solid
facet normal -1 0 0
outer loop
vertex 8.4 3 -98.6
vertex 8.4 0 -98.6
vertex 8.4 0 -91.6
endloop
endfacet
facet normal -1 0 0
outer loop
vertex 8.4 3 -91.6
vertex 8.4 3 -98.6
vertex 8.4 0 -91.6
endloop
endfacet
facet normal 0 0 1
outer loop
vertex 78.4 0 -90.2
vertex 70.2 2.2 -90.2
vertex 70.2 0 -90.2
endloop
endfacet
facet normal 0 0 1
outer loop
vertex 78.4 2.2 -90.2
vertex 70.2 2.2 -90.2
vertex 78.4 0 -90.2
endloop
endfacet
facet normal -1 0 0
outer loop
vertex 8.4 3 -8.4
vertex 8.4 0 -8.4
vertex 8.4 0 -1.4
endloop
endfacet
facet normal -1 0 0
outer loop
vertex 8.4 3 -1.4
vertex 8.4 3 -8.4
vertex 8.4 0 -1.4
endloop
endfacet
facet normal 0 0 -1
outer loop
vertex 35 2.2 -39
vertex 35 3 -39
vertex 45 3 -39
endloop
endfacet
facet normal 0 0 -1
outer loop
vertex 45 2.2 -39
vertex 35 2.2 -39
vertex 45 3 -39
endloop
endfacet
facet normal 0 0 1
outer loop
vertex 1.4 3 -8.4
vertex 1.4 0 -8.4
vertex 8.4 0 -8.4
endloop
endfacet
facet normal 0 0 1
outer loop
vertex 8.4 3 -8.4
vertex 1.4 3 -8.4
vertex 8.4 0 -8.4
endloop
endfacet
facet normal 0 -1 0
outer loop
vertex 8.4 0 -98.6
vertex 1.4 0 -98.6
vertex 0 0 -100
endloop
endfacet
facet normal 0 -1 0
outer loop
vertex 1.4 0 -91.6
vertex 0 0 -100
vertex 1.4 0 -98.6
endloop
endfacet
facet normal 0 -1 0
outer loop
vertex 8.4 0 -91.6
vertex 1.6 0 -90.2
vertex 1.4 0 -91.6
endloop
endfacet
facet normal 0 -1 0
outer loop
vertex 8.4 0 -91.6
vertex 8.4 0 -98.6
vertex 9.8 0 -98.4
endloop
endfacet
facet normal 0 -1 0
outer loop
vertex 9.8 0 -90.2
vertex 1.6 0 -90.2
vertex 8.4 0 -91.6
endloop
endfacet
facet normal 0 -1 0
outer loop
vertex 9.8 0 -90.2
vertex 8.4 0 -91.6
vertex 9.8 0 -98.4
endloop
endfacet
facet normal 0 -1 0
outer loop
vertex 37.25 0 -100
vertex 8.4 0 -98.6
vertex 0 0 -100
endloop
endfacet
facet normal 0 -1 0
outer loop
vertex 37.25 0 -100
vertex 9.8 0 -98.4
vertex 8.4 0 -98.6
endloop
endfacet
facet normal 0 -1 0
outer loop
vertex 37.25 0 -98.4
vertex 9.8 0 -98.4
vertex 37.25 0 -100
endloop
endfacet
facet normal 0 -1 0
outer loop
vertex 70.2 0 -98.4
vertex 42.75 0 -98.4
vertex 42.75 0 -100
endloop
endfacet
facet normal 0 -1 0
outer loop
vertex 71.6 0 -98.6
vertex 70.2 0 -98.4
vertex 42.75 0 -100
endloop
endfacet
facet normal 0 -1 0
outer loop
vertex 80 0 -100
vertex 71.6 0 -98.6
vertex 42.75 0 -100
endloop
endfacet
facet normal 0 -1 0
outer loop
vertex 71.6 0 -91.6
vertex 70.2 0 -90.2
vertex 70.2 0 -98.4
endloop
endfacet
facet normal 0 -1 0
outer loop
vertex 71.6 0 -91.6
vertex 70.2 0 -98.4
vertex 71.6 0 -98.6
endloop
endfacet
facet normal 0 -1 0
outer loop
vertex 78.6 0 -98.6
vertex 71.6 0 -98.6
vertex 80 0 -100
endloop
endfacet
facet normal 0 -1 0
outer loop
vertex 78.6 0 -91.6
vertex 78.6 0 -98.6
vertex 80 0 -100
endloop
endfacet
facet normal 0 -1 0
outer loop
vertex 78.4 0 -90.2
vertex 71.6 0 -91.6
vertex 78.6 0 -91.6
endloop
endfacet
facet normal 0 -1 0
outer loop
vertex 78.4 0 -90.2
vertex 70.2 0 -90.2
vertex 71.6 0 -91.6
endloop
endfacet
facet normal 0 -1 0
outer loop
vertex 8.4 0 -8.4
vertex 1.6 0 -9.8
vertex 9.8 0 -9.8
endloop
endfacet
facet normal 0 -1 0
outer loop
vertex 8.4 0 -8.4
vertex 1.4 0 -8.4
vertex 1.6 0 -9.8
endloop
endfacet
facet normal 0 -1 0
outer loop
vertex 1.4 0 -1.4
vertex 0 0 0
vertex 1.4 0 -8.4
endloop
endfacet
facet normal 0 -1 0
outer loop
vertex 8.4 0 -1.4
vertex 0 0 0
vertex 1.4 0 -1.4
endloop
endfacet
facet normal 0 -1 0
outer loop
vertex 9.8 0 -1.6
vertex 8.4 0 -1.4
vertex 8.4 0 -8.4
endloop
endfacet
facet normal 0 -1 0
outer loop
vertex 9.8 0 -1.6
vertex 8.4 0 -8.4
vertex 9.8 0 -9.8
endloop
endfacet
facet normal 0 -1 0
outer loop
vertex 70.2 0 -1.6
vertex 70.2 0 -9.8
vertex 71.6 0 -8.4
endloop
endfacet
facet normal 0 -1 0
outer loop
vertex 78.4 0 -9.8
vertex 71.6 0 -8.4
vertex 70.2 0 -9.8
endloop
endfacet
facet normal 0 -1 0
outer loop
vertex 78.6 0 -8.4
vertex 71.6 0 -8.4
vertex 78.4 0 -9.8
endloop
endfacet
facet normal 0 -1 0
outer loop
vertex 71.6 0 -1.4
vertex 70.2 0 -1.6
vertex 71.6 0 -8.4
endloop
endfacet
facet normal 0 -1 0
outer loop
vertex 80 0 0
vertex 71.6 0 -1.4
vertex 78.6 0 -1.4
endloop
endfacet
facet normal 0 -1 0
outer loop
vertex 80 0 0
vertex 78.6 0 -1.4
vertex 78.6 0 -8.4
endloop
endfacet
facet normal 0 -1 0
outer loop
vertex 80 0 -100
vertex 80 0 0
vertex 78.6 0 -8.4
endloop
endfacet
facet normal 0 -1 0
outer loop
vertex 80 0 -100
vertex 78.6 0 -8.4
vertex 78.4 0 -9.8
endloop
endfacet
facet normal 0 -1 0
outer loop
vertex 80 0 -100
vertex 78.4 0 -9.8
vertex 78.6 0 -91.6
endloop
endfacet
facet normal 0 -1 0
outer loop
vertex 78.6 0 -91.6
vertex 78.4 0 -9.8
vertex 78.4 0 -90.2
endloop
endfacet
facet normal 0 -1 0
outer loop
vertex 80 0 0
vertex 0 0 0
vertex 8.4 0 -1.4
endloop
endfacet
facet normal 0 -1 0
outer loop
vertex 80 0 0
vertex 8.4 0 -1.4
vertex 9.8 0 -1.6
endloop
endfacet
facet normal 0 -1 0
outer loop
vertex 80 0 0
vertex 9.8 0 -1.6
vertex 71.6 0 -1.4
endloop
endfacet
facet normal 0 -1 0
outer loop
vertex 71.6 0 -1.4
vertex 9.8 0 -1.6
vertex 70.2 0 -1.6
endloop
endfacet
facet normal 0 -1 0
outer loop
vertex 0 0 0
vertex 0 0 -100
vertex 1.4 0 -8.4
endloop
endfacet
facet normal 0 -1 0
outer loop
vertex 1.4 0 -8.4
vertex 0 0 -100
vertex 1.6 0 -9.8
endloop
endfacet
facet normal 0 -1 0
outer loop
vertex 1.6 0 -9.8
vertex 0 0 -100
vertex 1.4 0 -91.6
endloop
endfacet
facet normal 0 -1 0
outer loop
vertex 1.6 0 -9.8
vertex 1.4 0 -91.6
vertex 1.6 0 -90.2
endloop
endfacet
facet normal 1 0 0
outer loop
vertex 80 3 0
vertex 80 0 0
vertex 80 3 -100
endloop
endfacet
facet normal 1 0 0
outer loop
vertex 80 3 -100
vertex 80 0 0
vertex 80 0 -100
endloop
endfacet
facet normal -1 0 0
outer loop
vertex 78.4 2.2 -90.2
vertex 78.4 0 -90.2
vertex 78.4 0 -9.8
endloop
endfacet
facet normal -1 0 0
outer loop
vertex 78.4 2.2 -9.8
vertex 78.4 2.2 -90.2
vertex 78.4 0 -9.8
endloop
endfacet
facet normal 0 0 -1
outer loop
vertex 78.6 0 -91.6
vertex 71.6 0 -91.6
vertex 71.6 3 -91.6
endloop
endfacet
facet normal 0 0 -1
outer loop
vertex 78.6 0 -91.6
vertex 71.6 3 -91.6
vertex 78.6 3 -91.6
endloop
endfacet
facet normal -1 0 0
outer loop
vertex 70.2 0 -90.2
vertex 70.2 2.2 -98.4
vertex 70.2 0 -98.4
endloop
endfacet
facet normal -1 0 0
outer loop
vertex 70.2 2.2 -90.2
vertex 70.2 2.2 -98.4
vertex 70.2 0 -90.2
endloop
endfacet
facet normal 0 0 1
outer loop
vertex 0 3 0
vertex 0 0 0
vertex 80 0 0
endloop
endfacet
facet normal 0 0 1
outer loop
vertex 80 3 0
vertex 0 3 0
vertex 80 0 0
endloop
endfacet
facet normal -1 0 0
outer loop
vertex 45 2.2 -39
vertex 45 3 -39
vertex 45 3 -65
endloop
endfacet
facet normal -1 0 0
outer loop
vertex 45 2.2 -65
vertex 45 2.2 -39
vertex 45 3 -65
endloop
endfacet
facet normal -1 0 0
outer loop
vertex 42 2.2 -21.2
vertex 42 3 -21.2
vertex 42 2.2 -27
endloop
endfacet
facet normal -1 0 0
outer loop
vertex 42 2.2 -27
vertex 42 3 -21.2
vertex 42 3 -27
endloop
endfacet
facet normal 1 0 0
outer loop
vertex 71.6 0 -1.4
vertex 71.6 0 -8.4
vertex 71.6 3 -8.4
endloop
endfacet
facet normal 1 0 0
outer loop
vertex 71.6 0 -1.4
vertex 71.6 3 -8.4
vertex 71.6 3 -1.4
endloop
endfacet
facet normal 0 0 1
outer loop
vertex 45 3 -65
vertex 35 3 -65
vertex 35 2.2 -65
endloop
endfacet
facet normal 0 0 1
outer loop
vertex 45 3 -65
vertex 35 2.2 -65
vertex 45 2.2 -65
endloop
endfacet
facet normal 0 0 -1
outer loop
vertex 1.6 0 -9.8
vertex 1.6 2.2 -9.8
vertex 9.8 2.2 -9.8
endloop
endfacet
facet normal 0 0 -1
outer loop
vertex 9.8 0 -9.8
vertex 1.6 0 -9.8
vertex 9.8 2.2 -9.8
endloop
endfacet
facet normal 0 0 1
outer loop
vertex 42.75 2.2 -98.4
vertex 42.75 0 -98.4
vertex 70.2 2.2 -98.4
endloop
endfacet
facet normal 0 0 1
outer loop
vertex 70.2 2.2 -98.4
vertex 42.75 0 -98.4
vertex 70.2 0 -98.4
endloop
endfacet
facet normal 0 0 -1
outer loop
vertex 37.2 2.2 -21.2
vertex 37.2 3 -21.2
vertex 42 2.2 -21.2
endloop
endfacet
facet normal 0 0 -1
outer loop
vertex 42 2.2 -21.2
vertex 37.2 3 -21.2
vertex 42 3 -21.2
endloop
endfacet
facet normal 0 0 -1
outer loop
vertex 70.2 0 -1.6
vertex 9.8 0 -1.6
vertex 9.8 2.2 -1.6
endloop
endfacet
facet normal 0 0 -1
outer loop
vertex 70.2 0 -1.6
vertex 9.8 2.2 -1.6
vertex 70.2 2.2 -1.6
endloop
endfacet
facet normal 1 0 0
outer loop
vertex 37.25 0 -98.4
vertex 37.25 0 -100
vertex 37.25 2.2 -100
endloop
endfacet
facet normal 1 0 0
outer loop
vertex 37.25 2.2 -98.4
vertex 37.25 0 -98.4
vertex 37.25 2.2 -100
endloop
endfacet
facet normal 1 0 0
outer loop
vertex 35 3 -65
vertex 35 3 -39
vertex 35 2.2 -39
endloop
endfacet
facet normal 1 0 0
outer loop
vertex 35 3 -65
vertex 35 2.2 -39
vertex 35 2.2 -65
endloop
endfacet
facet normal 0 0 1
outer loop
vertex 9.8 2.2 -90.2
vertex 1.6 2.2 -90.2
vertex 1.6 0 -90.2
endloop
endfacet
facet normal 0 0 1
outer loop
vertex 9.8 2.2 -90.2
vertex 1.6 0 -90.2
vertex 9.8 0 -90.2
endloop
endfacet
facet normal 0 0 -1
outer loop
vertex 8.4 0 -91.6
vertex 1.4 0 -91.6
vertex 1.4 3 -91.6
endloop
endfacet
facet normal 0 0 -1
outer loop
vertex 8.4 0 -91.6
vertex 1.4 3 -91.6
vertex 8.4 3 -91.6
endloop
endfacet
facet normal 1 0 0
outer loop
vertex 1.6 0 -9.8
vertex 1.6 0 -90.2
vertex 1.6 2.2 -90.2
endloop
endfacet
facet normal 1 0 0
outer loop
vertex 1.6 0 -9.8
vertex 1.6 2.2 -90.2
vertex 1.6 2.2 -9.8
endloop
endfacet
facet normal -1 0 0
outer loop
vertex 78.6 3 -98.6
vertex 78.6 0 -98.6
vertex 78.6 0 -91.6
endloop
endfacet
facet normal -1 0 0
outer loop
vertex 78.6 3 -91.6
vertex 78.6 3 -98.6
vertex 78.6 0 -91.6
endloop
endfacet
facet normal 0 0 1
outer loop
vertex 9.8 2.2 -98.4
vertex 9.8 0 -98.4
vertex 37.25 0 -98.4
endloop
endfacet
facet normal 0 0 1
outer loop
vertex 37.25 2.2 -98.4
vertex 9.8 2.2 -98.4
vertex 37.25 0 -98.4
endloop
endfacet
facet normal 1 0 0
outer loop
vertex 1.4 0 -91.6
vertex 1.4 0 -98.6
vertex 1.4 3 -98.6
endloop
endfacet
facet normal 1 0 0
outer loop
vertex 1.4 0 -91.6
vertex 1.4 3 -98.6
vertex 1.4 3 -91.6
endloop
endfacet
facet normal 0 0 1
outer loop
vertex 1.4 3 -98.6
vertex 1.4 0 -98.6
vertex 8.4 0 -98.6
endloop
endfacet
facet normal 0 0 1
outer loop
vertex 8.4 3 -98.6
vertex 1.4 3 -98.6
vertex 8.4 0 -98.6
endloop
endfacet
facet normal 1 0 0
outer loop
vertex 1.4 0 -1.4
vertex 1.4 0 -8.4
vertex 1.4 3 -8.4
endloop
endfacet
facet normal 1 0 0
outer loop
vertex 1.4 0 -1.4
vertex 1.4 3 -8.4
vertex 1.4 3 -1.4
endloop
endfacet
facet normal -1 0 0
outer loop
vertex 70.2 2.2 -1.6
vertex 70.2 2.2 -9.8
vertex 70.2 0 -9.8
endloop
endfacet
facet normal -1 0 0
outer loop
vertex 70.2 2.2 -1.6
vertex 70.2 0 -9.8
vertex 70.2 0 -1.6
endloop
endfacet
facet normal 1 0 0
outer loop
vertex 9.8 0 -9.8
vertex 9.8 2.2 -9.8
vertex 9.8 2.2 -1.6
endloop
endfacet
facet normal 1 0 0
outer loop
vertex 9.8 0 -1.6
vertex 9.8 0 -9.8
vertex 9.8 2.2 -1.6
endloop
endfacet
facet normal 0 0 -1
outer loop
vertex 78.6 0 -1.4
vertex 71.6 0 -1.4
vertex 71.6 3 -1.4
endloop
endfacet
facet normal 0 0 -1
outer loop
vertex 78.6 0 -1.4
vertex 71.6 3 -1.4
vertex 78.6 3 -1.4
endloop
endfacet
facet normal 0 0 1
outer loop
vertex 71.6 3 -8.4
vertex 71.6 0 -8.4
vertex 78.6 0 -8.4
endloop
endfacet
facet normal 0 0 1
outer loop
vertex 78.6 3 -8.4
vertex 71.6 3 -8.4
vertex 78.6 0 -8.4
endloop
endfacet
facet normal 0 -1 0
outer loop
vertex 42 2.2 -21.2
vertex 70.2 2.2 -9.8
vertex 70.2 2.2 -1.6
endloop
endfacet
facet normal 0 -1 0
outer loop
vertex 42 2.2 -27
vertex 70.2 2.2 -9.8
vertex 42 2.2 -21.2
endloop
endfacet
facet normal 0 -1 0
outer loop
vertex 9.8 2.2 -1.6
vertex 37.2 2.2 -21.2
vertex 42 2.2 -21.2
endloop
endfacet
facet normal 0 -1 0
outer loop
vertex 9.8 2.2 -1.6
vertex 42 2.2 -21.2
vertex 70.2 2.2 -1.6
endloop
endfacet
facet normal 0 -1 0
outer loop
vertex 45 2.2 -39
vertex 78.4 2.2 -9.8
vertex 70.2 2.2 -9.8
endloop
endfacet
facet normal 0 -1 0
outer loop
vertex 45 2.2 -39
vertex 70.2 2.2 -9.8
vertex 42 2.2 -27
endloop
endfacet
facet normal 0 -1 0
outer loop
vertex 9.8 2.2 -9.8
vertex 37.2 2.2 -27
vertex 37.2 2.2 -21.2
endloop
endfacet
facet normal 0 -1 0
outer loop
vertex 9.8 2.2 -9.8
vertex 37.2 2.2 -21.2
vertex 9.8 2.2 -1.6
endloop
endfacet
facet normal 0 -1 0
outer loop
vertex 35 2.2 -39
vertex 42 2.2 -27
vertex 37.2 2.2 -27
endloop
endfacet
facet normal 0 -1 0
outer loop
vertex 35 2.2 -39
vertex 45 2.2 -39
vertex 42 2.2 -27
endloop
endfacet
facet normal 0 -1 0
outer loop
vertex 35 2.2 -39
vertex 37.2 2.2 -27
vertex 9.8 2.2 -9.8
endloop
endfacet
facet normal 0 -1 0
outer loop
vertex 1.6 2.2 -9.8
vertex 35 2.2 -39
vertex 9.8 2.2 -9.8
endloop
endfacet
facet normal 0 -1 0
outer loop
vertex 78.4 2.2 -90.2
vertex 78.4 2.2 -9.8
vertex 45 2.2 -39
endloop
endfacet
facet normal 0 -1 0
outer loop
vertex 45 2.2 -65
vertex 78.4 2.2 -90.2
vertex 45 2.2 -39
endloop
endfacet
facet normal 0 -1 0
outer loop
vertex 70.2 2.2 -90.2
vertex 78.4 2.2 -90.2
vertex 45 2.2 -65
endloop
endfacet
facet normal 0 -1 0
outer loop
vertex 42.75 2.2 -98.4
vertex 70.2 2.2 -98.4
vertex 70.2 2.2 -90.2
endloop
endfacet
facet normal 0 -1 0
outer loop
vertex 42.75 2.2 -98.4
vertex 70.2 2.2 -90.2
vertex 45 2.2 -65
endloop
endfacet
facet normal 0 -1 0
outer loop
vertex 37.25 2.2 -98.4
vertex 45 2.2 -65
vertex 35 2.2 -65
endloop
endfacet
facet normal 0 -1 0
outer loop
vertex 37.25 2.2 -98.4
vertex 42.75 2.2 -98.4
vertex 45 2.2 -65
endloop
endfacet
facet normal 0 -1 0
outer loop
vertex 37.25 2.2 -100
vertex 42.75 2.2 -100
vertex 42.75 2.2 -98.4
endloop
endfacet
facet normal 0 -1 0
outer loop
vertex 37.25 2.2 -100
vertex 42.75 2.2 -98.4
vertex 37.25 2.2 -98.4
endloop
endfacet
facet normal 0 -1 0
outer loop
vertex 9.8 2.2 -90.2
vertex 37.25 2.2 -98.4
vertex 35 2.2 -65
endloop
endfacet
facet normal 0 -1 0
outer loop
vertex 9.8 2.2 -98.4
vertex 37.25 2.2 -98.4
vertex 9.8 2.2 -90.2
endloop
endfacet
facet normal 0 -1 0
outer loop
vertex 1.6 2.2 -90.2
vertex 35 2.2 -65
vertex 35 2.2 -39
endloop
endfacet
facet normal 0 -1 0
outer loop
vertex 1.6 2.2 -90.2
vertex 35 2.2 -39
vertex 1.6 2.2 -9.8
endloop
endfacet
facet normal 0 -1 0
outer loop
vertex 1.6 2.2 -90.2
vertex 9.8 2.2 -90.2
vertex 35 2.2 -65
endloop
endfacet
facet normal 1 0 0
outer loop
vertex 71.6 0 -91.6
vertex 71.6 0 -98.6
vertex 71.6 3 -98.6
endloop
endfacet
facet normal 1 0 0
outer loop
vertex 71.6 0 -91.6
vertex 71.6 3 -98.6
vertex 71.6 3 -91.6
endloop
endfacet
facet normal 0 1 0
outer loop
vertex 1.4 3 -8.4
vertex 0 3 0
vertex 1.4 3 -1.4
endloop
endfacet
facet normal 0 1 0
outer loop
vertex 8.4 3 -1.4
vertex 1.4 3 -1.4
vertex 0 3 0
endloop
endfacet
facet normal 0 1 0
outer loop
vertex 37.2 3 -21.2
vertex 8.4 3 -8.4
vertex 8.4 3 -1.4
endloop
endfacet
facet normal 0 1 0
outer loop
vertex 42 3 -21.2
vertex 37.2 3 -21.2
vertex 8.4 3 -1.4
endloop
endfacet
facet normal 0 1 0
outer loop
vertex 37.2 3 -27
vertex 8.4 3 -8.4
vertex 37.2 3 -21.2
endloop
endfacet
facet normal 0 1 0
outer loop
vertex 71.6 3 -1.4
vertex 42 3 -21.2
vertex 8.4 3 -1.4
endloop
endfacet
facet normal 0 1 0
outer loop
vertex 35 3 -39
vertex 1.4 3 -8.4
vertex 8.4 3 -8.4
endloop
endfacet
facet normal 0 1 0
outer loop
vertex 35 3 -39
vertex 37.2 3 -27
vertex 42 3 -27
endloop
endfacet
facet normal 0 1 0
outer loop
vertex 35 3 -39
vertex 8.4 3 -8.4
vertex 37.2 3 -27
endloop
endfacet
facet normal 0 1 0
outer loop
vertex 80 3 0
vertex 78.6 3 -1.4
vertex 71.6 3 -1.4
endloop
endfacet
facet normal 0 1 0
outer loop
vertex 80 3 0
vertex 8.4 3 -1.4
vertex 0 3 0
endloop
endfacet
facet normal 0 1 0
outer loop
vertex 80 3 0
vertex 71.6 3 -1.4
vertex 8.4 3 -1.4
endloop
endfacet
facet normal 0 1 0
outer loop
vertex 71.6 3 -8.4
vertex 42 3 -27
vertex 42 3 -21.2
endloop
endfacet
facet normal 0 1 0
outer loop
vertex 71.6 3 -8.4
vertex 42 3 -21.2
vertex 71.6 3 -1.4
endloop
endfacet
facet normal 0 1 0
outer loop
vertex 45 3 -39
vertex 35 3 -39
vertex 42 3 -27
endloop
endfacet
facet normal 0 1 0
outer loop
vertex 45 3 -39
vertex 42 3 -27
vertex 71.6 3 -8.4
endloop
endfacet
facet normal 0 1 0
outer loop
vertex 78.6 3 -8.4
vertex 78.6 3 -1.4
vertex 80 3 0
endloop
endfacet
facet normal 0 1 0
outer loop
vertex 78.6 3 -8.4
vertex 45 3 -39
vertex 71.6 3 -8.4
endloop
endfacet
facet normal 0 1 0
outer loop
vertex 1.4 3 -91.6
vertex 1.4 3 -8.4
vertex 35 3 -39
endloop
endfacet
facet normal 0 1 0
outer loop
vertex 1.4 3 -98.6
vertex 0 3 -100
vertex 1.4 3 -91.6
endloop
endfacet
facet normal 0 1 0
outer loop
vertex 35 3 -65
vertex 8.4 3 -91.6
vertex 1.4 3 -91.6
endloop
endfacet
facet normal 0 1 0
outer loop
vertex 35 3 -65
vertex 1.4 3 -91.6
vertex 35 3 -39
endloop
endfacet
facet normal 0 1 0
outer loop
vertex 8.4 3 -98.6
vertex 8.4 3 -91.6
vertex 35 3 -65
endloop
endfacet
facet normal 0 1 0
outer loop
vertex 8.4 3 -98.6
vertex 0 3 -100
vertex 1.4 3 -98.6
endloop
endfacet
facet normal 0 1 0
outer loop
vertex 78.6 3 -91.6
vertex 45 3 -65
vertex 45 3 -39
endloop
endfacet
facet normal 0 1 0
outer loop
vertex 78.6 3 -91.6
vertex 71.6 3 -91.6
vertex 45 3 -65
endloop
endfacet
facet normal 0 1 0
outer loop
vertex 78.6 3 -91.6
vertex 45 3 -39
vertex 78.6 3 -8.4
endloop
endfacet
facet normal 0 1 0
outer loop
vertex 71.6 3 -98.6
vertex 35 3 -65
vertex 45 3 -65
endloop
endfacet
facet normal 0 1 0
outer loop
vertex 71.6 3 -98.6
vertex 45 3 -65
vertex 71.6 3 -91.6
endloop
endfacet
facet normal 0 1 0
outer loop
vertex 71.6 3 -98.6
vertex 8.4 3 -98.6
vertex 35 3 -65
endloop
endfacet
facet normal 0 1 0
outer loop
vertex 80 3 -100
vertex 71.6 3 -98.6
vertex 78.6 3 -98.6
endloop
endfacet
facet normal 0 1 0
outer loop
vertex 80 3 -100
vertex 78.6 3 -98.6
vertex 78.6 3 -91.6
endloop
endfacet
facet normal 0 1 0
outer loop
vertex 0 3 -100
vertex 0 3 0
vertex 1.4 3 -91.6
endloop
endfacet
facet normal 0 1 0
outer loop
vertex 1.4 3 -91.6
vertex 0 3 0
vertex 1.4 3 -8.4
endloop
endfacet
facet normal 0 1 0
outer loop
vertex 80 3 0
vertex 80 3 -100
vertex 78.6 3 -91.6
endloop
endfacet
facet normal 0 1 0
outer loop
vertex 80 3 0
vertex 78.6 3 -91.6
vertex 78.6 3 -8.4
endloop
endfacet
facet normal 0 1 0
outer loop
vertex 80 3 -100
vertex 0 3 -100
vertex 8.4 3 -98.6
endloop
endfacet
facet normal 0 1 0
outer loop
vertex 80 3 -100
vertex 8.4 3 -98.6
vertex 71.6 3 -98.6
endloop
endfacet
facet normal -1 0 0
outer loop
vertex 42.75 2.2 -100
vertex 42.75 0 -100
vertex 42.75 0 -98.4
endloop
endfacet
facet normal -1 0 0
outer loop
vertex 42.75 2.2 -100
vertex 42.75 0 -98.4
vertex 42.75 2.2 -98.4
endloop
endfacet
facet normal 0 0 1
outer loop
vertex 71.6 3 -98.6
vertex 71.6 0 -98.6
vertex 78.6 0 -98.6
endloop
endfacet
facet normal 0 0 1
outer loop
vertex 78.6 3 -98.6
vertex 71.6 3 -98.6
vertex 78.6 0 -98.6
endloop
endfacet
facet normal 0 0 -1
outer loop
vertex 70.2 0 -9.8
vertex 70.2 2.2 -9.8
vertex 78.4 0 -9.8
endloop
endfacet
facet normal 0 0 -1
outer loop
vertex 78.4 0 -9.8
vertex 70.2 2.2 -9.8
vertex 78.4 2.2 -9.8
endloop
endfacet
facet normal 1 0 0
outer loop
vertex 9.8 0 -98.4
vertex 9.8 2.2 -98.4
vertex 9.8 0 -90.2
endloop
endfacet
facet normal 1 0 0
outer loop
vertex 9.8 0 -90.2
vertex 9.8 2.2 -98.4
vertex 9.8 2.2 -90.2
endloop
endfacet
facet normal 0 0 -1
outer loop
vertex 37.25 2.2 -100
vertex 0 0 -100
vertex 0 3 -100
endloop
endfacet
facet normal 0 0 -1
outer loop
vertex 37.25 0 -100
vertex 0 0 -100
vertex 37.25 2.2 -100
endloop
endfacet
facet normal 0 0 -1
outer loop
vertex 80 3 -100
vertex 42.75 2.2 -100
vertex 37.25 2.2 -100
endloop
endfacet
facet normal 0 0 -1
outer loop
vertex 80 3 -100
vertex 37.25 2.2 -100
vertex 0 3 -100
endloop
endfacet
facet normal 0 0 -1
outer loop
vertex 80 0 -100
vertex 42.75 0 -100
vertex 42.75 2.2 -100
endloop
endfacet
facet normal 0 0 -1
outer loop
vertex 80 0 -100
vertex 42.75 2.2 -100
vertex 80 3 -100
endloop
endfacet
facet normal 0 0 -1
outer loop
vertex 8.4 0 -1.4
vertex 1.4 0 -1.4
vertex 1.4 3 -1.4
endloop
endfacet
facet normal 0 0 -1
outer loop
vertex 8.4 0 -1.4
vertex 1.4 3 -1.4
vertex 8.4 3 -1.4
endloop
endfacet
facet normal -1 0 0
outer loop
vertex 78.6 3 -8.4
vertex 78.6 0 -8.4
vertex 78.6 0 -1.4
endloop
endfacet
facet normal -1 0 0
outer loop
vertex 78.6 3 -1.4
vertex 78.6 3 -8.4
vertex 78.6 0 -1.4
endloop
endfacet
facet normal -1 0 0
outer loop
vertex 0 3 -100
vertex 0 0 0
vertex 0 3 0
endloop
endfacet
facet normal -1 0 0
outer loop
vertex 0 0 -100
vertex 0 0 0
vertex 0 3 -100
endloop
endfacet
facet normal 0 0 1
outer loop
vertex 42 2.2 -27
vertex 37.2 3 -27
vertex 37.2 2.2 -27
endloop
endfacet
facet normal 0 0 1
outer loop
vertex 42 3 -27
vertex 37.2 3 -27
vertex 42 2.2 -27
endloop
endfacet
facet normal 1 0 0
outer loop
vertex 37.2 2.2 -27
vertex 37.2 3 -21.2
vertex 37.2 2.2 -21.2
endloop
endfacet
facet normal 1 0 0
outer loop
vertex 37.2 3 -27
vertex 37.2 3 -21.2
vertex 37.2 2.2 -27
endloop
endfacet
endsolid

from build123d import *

# Parameters (mm, degrees)
SKETCH1_W           = 80
SKETCH1_H           = 100
BOSS_EXTRUDE1_DEPTH = 3
SKETCH2_W           = 76.8
SKETCH2_H           = 96.8
CUT_EXTRUDE1_DEPTH  = 2.2
CUT_EXTRUDE2_REACH  = 5
SKETCH5_W           = 10
SKETCH5_H           = 26
SKETCH5_W_2         = 4.8
SKETCH5_H_2         = 5.8
SKETCH7_W           = 5.5
SKETCH7_H           = 2.2
CUT_EXTRUDE4_DEPTH  = 3
SKETCH9_W           = 8.2
SKETCH9_H           = 8.2
BOSS_EXTRUDE2_DEPTH = 2.2
SKETCH10_W          = 7
SKETCH10_H          = 7
CUT_EXTRUDE5_DEPTH  = 4


with BuildPart() as part:
    # Sketch1 → Boss-Extrude1 (new body)
    with BuildSketch(Plane(origin=(0, 0, 0), x_dir=(1, 0, 0), z_dir=(0, 1, 0))):
        with Locations((40, 50)):
            Rectangle(SKETCH1_W, SKETCH1_H)
    extrude(amount=BOSS_EXTRUDE1_DEPTH)

    # Sketch2 → Cut-Extrude1 (cut)
    with BuildSketch(Plane.XZ):
        with Locations((40, -50)):
            Rectangle(SKETCH2_W, SKETCH2_H)
    extrude(amount=-CUT_EXTRUDE1_DEPTH, mode=Mode.SUBTRACT)

    # Sketch5 → Cut-Extrude2 (cut, up to next)
    with BuildSketch(Plane(origin=(0, 3, 0), x_dir=(1, 0, 0), z_dir=(0, 1, 0)), mode=Mode.PRIVATE) as cut_extrude2_sk1:
        with Locations((40, 52)):
            Rectangle(SKETCH5_W, SKETCH5_H)
    cut_extrude2_tool1 = extrude(cut_extrude2_sk1.sketch, amount=-CUT_EXTRUDE2_REACH, mode=Mode.PRIVATE) & part.part
    add(cut_extrude2_tool1.solids().sort_by_distance((40, 3, -52))[0], mode=Mode.SUBTRACT)
    # Sketch5 → Cut-Extrude2 (cut, up to next)
    with BuildSketch(Plane(origin=(0, 3, 0), x_dir=(1, 0, 0), z_dir=(0, 1, 0)), mode=Mode.PRIVATE) as cut_extrude2_sk2:
        with Locations((39.6, 24.1)):
            Rectangle(SKETCH5_W_2, SKETCH5_H_2)
    cut_extrude2_tool2 = extrude(cut_extrude2_sk2.sketch, amount=-CUT_EXTRUDE2_REACH, mode=Mode.PRIVATE) & part.part
    add(cut_extrude2_tool2.solids().sort_by_distance((39.6, 3, -24.1))[0], mode=Mode.SUBTRACT)

    # Sketch7 → Cut-Extrude4 (cut)
    with BuildSketch(Plane(origin=(0, 0, -100), x_dir=(-1, 0, 0), z_dir=(0, 0, -1))):
        with Locations((-40, 1.1)):
            Rectangle(SKETCH7_W, SKETCH7_H)
    extrude(amount=-CUT_EXTRUDE4_DEPTH, mode=Mode.SUBTRACT)

    # Sketch9 → Boss-Extrude2 (add)
    with BuildSketch(Plane.XZ.offset(-2.2)):
        with Locations((5.7, -5.7)):
            Rectangle(SKETCH9_W, SKETCH9_H)
        with Locations((74.3, -5.7)):
            Rectangle(SKETCH9_W, SKETCH9_H)
        with Locations((5.7, -94.3)):
            Rectangle(SKETCH9_W, SKETCH9_H)
        with Locations((74.3, -94.3)):
            Rectangle(SKETCH9_W, SKETCH9_H)
    extrude(amount=BOSS_EXTRUDE2_DEPTH)

    # Sketch10 → Cut-Extrude5 (cut, through all)
    with BuildSketch(Plane.XZ):
        with Locations((4.9, -4.9)):
            Rectangle(SKETCH10_W, SKETCH10_H)
        with Locations((4.9, -95.1)):
            Rectangle(SKETCH10_W, SKETCH10_H)
        with Locations((75.1, -95.1)):
            Rectangle(SKETCH10_W, SKETCH10_H)
        with Locations((75.1, -4.9)):
            Rectangle(SKETCH10_W, SKETCH10_H)
    extrude(amount=-CUT_EXTRUDE5_DEPTH, mode=Mode.SUBTRACT)


solid = part.part
